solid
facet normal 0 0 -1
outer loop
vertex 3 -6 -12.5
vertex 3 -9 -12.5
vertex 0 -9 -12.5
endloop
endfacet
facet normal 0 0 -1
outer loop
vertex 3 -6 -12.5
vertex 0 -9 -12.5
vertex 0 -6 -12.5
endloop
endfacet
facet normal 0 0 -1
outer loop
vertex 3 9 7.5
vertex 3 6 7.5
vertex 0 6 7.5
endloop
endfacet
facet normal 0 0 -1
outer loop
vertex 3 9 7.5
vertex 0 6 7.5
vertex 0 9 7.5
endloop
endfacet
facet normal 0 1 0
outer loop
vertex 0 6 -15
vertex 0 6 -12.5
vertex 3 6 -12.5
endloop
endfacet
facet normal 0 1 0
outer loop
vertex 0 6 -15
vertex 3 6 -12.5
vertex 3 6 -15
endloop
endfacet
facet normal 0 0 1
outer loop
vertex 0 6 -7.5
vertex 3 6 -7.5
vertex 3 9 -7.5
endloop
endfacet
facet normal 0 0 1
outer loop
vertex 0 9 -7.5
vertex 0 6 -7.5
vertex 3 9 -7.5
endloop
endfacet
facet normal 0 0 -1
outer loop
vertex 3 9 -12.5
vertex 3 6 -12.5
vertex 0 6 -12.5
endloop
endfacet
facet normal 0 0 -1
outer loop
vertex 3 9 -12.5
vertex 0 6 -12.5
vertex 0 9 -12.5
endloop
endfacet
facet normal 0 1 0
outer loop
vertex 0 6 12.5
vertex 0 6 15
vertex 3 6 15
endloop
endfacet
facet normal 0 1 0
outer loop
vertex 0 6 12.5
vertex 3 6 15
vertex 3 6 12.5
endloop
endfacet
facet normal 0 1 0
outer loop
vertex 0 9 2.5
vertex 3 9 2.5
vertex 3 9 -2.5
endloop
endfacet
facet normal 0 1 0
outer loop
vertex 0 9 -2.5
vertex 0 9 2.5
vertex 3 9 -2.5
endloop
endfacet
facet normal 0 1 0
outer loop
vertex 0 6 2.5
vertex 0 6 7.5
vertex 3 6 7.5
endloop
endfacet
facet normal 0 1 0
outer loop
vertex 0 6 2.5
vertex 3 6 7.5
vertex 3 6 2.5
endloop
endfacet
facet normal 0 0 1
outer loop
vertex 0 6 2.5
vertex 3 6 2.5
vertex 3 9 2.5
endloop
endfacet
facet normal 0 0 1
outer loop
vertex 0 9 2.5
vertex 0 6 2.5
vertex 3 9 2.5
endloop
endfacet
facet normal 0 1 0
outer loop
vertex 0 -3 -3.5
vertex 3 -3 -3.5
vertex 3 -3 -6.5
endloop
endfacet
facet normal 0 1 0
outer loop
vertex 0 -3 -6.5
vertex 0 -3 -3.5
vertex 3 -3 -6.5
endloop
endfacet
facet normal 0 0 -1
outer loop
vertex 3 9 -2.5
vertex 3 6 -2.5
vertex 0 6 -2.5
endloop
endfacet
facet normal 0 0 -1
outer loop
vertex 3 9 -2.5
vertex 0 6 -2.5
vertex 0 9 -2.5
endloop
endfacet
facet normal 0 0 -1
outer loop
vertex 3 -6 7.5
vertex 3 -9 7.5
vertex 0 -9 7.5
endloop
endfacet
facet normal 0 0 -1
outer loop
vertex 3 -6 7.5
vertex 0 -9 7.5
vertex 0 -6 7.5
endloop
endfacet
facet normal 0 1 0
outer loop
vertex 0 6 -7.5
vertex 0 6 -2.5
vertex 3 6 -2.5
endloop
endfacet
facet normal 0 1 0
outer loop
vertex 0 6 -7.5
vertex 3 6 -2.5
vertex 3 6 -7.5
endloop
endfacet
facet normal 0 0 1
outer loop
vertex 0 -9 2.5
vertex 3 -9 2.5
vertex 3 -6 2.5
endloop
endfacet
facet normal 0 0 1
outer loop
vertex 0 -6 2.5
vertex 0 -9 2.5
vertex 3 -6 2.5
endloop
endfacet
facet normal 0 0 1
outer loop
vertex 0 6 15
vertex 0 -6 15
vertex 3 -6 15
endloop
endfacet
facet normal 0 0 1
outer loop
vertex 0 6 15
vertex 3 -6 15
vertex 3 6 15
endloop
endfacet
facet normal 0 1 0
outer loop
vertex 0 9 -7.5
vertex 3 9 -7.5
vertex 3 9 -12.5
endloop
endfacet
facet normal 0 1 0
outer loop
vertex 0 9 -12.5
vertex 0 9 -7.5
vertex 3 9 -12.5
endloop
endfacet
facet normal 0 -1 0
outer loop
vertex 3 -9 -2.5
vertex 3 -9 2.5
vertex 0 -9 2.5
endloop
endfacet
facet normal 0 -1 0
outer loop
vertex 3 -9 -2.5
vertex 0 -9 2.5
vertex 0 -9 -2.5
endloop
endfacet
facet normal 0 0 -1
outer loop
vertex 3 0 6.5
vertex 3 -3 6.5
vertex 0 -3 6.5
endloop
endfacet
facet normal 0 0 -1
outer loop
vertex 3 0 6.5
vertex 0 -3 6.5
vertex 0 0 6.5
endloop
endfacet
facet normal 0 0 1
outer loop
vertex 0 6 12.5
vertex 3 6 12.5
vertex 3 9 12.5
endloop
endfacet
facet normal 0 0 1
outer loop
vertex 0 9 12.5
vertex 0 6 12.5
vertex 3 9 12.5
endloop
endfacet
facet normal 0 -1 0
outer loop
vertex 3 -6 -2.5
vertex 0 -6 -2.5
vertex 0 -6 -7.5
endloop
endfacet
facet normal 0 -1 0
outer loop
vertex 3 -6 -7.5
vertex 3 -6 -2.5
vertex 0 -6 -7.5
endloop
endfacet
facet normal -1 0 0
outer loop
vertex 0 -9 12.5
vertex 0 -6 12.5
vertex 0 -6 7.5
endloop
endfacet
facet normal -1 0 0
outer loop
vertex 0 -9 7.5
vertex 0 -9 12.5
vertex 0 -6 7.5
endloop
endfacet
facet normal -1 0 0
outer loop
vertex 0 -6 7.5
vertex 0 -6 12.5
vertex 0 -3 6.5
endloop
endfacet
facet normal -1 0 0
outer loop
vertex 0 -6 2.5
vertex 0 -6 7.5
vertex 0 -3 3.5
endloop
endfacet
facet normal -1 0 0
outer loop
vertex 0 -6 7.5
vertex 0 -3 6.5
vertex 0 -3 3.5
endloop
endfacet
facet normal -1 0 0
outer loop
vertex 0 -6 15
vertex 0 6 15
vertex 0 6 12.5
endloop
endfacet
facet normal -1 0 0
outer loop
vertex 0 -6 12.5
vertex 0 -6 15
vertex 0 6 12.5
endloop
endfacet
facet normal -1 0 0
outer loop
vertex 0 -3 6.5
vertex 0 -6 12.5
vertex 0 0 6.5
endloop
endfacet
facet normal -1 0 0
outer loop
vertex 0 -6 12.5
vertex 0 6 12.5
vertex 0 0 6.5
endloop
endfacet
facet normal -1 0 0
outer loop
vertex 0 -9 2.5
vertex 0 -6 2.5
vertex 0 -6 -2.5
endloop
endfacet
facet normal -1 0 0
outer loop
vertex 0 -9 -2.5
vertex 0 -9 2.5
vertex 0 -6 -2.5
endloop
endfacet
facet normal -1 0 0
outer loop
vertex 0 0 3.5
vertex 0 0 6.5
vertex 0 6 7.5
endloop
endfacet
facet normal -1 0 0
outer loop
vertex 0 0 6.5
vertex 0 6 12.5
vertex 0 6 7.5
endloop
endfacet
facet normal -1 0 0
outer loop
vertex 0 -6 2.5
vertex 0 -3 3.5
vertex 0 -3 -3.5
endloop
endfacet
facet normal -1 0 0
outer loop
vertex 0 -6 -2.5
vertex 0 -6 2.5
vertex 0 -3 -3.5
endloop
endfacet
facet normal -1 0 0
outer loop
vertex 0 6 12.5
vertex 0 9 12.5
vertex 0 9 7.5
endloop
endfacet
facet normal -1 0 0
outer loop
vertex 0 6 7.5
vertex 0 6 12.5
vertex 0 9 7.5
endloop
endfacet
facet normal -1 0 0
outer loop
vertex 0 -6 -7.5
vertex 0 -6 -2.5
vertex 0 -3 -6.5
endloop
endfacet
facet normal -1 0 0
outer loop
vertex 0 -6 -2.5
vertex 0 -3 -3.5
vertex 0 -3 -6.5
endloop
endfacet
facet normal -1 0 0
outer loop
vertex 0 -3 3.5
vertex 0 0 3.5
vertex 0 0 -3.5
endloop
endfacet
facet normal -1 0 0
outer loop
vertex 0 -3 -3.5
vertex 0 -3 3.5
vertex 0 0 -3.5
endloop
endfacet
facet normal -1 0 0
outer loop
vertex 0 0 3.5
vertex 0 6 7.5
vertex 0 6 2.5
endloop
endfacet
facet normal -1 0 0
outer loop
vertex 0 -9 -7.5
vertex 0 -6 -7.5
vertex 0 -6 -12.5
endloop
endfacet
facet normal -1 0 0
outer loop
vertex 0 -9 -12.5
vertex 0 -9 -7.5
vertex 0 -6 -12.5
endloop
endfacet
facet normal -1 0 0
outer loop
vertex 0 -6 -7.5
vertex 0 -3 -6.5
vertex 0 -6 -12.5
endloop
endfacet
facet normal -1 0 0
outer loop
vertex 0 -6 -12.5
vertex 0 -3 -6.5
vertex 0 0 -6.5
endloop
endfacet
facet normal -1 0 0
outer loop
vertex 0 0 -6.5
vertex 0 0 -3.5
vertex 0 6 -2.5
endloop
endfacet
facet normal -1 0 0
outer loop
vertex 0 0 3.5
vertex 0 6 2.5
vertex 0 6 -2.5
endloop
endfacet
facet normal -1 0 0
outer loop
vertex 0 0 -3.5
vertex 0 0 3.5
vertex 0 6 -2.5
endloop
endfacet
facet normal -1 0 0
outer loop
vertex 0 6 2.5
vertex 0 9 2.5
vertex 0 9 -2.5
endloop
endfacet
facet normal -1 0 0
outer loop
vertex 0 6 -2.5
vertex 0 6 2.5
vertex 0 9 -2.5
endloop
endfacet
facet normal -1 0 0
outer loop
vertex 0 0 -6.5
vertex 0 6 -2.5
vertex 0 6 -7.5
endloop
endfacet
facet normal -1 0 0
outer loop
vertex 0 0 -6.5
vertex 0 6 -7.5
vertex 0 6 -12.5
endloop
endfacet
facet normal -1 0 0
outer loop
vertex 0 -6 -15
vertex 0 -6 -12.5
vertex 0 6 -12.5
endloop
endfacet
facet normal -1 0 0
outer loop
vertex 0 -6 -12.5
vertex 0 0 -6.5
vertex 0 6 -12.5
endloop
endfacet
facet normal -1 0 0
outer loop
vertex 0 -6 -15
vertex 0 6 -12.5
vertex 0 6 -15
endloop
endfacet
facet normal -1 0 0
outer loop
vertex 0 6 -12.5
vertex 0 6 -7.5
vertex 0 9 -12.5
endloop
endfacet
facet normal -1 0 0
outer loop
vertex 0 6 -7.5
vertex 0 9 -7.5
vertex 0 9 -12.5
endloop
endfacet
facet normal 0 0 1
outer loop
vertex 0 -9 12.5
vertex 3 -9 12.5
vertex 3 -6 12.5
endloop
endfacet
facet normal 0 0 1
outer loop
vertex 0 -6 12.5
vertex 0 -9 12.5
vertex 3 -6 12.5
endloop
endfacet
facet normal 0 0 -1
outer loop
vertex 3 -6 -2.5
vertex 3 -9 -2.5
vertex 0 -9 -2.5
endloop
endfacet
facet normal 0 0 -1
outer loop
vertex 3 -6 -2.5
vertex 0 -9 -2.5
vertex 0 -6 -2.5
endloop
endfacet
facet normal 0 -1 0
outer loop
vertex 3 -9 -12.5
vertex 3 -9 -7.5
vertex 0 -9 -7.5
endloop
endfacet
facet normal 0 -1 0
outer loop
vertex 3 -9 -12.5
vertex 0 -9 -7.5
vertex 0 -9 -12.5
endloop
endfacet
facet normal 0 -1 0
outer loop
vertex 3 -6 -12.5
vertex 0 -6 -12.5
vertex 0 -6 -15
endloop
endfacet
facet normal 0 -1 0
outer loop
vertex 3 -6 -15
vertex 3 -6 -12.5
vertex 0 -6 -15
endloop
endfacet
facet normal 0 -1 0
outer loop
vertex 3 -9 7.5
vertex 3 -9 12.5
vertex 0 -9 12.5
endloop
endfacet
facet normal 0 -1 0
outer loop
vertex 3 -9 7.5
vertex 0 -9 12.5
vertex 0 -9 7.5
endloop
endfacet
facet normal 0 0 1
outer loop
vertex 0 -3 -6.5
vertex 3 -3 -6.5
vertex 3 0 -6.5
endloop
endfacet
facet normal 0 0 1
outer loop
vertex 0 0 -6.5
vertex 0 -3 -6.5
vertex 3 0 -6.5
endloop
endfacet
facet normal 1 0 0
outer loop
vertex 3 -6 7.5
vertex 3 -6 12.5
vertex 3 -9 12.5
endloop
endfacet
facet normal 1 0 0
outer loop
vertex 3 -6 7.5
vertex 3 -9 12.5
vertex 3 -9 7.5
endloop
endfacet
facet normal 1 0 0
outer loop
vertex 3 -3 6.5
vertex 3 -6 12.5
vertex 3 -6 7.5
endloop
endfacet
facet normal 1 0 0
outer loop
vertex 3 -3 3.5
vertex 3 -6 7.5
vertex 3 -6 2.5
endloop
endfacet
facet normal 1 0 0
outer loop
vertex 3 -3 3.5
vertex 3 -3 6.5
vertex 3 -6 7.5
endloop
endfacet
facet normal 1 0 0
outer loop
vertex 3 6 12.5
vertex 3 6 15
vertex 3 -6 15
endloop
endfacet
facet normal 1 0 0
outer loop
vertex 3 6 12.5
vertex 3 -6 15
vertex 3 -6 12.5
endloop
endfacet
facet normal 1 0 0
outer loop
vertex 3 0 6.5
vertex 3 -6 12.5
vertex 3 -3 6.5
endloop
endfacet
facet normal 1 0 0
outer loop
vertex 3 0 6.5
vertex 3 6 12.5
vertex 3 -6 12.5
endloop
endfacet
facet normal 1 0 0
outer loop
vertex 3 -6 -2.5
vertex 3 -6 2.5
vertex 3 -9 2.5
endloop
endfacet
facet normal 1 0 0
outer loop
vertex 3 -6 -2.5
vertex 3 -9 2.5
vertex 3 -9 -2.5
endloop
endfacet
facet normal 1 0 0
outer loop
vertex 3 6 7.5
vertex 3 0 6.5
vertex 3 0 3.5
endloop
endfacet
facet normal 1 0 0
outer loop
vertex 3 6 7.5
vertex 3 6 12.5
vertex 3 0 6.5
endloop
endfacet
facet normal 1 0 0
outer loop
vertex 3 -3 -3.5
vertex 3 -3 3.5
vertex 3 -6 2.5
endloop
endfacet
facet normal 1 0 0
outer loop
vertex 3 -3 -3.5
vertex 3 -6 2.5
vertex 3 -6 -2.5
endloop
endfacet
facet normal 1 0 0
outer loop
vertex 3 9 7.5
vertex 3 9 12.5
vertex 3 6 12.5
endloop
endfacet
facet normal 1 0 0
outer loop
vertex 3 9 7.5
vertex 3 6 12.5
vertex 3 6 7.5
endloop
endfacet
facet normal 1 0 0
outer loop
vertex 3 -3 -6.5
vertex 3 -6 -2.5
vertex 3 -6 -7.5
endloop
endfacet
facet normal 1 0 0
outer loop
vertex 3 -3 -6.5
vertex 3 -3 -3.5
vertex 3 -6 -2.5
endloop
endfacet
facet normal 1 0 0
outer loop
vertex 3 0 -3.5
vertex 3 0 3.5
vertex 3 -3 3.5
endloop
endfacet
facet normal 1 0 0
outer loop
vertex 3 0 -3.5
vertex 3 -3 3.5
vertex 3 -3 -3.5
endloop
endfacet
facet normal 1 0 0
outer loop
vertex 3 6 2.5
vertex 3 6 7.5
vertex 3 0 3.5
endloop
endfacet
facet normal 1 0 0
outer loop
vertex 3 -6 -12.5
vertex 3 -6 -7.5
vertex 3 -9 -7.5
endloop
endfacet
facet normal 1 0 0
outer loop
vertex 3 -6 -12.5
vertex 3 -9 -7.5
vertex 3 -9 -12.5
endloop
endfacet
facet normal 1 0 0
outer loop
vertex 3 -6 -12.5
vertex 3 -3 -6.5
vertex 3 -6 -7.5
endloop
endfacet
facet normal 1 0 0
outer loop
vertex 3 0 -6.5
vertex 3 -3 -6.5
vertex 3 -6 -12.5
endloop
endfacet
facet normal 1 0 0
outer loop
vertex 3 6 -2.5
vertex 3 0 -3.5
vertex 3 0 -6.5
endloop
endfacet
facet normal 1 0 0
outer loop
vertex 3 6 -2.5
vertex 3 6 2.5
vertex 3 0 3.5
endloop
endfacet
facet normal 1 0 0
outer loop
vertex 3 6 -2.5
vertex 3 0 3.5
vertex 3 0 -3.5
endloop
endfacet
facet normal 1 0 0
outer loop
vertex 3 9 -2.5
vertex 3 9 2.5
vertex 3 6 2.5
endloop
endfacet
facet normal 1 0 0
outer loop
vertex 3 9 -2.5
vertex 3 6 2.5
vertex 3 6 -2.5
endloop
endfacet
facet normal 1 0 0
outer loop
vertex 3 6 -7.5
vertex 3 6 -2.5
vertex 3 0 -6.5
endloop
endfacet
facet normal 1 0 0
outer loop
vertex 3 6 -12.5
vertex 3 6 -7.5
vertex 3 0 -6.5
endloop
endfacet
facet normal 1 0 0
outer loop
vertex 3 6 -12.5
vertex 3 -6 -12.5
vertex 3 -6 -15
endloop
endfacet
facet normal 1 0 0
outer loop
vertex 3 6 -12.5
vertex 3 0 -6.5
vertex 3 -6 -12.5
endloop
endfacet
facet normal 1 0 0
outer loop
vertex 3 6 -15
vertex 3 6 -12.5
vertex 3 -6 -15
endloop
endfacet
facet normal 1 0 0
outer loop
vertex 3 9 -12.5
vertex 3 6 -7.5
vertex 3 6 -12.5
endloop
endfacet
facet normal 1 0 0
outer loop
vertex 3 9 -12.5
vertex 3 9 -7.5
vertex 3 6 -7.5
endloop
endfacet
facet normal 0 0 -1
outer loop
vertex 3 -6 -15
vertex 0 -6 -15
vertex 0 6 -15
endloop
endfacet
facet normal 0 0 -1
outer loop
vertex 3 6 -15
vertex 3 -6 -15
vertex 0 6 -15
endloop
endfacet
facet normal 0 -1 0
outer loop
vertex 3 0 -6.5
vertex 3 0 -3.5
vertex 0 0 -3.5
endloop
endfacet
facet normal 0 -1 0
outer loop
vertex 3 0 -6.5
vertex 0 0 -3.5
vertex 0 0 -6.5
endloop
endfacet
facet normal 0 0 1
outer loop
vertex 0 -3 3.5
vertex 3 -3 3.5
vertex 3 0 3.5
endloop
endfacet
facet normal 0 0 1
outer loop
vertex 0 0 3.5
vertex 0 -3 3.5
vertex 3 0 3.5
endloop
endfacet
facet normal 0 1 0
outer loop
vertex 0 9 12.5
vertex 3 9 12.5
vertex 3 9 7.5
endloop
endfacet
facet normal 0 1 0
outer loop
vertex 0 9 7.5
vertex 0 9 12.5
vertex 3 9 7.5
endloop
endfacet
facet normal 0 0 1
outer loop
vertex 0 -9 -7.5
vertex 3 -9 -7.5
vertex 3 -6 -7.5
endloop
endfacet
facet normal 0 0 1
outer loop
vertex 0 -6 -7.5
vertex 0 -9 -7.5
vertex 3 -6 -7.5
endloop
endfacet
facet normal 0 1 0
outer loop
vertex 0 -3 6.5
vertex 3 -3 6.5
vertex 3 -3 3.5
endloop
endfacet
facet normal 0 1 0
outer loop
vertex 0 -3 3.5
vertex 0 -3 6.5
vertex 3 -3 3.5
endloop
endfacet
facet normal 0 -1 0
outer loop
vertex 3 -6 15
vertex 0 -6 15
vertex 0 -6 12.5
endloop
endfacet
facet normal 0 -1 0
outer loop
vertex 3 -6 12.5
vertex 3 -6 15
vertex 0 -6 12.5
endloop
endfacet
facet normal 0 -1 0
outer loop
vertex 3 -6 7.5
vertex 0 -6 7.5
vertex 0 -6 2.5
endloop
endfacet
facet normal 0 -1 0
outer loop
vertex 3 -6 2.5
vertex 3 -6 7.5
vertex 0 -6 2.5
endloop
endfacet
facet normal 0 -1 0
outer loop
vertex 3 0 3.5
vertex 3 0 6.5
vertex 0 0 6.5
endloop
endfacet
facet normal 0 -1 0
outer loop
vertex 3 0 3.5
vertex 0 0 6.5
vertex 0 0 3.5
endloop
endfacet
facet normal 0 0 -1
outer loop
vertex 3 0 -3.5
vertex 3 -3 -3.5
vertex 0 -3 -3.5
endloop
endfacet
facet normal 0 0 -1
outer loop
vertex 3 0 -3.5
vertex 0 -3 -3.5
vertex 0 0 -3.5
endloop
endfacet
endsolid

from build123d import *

# Parameters (mm, degrees)
SKETCH1_W           = 30
SKETCH1_H           = 12
BOSS_EXTRUDE1_DEPTH = 3
SKETCH3_W           = 5
SKETCH3_H           = 3
BOSS_EXTRUDE2_DEPTH = 3
SKETCH4_W           = 3
SKETCH4_H           = 3
CUT_EXTRUDE1_DEPTH  = 10


with BuildPart() as part:
    # Sketch1 → Boss-Extrude1 (new body)
    with BuildSketch(Plane(origin=(0, 0, 0), x_dir=(0, 0, -1), z_dir=(1, 0, 0))):
        Rectangle(SKETCH1_W, SKETCH1_H)
    extrude(amount=BOSS_EXTRUDE1_DEPTH)

    # Sketch3 → Boss-Extrude2 (add)
    with BuildSketch(Plane(origin=(3, 0, 0), x_dir=(0, 0, -1), z_dir=(1, 0, 0))):
        with Locations((-10, 7.5)):
            Rectangle(SKETCH3_W, SKETCH3_H)
        with Locations((0, 7.5)):
            Rectangle(SKETCH3_W, SKETCH3_H)
        with Locations((10, 7.5)):
            Rectangle(SKETCH3_W, SKETCH3_H)
        with Locations((10, -7.5)):
            Rectangle(SKETCH3_W, SKETCH3_H)
        with Locations((0, -7.5)):
            Rectangle(SKETCH3_W, SKETCH3_H)
        with Locations((-10, -7.5)):
            Rectangle(SKETCH3_W, SKETCH3_H)
    extrude(amount=-BOSS_EXTRUDE2_DEPTH)

    # Sketch4 → Cut-Extrude1 (cut)
    with BuildSketch(Plane(origin=(3, 0, 0), x_dir=(0, 0, -1), z_dir=(1, 0, 0))):
        with Locations((-5, -1.5)):
            Rectangle(SKETCH4_W, SKETCH4_H)
        with Locations((5, -1.5)):
            Rectangle(SKETCH4_W, SKETCH4_H)
    extrude(amount=-CUT_EXTRUDE1_DEPTH, mode=Mode.SUBTRACT)


solid = part.part
